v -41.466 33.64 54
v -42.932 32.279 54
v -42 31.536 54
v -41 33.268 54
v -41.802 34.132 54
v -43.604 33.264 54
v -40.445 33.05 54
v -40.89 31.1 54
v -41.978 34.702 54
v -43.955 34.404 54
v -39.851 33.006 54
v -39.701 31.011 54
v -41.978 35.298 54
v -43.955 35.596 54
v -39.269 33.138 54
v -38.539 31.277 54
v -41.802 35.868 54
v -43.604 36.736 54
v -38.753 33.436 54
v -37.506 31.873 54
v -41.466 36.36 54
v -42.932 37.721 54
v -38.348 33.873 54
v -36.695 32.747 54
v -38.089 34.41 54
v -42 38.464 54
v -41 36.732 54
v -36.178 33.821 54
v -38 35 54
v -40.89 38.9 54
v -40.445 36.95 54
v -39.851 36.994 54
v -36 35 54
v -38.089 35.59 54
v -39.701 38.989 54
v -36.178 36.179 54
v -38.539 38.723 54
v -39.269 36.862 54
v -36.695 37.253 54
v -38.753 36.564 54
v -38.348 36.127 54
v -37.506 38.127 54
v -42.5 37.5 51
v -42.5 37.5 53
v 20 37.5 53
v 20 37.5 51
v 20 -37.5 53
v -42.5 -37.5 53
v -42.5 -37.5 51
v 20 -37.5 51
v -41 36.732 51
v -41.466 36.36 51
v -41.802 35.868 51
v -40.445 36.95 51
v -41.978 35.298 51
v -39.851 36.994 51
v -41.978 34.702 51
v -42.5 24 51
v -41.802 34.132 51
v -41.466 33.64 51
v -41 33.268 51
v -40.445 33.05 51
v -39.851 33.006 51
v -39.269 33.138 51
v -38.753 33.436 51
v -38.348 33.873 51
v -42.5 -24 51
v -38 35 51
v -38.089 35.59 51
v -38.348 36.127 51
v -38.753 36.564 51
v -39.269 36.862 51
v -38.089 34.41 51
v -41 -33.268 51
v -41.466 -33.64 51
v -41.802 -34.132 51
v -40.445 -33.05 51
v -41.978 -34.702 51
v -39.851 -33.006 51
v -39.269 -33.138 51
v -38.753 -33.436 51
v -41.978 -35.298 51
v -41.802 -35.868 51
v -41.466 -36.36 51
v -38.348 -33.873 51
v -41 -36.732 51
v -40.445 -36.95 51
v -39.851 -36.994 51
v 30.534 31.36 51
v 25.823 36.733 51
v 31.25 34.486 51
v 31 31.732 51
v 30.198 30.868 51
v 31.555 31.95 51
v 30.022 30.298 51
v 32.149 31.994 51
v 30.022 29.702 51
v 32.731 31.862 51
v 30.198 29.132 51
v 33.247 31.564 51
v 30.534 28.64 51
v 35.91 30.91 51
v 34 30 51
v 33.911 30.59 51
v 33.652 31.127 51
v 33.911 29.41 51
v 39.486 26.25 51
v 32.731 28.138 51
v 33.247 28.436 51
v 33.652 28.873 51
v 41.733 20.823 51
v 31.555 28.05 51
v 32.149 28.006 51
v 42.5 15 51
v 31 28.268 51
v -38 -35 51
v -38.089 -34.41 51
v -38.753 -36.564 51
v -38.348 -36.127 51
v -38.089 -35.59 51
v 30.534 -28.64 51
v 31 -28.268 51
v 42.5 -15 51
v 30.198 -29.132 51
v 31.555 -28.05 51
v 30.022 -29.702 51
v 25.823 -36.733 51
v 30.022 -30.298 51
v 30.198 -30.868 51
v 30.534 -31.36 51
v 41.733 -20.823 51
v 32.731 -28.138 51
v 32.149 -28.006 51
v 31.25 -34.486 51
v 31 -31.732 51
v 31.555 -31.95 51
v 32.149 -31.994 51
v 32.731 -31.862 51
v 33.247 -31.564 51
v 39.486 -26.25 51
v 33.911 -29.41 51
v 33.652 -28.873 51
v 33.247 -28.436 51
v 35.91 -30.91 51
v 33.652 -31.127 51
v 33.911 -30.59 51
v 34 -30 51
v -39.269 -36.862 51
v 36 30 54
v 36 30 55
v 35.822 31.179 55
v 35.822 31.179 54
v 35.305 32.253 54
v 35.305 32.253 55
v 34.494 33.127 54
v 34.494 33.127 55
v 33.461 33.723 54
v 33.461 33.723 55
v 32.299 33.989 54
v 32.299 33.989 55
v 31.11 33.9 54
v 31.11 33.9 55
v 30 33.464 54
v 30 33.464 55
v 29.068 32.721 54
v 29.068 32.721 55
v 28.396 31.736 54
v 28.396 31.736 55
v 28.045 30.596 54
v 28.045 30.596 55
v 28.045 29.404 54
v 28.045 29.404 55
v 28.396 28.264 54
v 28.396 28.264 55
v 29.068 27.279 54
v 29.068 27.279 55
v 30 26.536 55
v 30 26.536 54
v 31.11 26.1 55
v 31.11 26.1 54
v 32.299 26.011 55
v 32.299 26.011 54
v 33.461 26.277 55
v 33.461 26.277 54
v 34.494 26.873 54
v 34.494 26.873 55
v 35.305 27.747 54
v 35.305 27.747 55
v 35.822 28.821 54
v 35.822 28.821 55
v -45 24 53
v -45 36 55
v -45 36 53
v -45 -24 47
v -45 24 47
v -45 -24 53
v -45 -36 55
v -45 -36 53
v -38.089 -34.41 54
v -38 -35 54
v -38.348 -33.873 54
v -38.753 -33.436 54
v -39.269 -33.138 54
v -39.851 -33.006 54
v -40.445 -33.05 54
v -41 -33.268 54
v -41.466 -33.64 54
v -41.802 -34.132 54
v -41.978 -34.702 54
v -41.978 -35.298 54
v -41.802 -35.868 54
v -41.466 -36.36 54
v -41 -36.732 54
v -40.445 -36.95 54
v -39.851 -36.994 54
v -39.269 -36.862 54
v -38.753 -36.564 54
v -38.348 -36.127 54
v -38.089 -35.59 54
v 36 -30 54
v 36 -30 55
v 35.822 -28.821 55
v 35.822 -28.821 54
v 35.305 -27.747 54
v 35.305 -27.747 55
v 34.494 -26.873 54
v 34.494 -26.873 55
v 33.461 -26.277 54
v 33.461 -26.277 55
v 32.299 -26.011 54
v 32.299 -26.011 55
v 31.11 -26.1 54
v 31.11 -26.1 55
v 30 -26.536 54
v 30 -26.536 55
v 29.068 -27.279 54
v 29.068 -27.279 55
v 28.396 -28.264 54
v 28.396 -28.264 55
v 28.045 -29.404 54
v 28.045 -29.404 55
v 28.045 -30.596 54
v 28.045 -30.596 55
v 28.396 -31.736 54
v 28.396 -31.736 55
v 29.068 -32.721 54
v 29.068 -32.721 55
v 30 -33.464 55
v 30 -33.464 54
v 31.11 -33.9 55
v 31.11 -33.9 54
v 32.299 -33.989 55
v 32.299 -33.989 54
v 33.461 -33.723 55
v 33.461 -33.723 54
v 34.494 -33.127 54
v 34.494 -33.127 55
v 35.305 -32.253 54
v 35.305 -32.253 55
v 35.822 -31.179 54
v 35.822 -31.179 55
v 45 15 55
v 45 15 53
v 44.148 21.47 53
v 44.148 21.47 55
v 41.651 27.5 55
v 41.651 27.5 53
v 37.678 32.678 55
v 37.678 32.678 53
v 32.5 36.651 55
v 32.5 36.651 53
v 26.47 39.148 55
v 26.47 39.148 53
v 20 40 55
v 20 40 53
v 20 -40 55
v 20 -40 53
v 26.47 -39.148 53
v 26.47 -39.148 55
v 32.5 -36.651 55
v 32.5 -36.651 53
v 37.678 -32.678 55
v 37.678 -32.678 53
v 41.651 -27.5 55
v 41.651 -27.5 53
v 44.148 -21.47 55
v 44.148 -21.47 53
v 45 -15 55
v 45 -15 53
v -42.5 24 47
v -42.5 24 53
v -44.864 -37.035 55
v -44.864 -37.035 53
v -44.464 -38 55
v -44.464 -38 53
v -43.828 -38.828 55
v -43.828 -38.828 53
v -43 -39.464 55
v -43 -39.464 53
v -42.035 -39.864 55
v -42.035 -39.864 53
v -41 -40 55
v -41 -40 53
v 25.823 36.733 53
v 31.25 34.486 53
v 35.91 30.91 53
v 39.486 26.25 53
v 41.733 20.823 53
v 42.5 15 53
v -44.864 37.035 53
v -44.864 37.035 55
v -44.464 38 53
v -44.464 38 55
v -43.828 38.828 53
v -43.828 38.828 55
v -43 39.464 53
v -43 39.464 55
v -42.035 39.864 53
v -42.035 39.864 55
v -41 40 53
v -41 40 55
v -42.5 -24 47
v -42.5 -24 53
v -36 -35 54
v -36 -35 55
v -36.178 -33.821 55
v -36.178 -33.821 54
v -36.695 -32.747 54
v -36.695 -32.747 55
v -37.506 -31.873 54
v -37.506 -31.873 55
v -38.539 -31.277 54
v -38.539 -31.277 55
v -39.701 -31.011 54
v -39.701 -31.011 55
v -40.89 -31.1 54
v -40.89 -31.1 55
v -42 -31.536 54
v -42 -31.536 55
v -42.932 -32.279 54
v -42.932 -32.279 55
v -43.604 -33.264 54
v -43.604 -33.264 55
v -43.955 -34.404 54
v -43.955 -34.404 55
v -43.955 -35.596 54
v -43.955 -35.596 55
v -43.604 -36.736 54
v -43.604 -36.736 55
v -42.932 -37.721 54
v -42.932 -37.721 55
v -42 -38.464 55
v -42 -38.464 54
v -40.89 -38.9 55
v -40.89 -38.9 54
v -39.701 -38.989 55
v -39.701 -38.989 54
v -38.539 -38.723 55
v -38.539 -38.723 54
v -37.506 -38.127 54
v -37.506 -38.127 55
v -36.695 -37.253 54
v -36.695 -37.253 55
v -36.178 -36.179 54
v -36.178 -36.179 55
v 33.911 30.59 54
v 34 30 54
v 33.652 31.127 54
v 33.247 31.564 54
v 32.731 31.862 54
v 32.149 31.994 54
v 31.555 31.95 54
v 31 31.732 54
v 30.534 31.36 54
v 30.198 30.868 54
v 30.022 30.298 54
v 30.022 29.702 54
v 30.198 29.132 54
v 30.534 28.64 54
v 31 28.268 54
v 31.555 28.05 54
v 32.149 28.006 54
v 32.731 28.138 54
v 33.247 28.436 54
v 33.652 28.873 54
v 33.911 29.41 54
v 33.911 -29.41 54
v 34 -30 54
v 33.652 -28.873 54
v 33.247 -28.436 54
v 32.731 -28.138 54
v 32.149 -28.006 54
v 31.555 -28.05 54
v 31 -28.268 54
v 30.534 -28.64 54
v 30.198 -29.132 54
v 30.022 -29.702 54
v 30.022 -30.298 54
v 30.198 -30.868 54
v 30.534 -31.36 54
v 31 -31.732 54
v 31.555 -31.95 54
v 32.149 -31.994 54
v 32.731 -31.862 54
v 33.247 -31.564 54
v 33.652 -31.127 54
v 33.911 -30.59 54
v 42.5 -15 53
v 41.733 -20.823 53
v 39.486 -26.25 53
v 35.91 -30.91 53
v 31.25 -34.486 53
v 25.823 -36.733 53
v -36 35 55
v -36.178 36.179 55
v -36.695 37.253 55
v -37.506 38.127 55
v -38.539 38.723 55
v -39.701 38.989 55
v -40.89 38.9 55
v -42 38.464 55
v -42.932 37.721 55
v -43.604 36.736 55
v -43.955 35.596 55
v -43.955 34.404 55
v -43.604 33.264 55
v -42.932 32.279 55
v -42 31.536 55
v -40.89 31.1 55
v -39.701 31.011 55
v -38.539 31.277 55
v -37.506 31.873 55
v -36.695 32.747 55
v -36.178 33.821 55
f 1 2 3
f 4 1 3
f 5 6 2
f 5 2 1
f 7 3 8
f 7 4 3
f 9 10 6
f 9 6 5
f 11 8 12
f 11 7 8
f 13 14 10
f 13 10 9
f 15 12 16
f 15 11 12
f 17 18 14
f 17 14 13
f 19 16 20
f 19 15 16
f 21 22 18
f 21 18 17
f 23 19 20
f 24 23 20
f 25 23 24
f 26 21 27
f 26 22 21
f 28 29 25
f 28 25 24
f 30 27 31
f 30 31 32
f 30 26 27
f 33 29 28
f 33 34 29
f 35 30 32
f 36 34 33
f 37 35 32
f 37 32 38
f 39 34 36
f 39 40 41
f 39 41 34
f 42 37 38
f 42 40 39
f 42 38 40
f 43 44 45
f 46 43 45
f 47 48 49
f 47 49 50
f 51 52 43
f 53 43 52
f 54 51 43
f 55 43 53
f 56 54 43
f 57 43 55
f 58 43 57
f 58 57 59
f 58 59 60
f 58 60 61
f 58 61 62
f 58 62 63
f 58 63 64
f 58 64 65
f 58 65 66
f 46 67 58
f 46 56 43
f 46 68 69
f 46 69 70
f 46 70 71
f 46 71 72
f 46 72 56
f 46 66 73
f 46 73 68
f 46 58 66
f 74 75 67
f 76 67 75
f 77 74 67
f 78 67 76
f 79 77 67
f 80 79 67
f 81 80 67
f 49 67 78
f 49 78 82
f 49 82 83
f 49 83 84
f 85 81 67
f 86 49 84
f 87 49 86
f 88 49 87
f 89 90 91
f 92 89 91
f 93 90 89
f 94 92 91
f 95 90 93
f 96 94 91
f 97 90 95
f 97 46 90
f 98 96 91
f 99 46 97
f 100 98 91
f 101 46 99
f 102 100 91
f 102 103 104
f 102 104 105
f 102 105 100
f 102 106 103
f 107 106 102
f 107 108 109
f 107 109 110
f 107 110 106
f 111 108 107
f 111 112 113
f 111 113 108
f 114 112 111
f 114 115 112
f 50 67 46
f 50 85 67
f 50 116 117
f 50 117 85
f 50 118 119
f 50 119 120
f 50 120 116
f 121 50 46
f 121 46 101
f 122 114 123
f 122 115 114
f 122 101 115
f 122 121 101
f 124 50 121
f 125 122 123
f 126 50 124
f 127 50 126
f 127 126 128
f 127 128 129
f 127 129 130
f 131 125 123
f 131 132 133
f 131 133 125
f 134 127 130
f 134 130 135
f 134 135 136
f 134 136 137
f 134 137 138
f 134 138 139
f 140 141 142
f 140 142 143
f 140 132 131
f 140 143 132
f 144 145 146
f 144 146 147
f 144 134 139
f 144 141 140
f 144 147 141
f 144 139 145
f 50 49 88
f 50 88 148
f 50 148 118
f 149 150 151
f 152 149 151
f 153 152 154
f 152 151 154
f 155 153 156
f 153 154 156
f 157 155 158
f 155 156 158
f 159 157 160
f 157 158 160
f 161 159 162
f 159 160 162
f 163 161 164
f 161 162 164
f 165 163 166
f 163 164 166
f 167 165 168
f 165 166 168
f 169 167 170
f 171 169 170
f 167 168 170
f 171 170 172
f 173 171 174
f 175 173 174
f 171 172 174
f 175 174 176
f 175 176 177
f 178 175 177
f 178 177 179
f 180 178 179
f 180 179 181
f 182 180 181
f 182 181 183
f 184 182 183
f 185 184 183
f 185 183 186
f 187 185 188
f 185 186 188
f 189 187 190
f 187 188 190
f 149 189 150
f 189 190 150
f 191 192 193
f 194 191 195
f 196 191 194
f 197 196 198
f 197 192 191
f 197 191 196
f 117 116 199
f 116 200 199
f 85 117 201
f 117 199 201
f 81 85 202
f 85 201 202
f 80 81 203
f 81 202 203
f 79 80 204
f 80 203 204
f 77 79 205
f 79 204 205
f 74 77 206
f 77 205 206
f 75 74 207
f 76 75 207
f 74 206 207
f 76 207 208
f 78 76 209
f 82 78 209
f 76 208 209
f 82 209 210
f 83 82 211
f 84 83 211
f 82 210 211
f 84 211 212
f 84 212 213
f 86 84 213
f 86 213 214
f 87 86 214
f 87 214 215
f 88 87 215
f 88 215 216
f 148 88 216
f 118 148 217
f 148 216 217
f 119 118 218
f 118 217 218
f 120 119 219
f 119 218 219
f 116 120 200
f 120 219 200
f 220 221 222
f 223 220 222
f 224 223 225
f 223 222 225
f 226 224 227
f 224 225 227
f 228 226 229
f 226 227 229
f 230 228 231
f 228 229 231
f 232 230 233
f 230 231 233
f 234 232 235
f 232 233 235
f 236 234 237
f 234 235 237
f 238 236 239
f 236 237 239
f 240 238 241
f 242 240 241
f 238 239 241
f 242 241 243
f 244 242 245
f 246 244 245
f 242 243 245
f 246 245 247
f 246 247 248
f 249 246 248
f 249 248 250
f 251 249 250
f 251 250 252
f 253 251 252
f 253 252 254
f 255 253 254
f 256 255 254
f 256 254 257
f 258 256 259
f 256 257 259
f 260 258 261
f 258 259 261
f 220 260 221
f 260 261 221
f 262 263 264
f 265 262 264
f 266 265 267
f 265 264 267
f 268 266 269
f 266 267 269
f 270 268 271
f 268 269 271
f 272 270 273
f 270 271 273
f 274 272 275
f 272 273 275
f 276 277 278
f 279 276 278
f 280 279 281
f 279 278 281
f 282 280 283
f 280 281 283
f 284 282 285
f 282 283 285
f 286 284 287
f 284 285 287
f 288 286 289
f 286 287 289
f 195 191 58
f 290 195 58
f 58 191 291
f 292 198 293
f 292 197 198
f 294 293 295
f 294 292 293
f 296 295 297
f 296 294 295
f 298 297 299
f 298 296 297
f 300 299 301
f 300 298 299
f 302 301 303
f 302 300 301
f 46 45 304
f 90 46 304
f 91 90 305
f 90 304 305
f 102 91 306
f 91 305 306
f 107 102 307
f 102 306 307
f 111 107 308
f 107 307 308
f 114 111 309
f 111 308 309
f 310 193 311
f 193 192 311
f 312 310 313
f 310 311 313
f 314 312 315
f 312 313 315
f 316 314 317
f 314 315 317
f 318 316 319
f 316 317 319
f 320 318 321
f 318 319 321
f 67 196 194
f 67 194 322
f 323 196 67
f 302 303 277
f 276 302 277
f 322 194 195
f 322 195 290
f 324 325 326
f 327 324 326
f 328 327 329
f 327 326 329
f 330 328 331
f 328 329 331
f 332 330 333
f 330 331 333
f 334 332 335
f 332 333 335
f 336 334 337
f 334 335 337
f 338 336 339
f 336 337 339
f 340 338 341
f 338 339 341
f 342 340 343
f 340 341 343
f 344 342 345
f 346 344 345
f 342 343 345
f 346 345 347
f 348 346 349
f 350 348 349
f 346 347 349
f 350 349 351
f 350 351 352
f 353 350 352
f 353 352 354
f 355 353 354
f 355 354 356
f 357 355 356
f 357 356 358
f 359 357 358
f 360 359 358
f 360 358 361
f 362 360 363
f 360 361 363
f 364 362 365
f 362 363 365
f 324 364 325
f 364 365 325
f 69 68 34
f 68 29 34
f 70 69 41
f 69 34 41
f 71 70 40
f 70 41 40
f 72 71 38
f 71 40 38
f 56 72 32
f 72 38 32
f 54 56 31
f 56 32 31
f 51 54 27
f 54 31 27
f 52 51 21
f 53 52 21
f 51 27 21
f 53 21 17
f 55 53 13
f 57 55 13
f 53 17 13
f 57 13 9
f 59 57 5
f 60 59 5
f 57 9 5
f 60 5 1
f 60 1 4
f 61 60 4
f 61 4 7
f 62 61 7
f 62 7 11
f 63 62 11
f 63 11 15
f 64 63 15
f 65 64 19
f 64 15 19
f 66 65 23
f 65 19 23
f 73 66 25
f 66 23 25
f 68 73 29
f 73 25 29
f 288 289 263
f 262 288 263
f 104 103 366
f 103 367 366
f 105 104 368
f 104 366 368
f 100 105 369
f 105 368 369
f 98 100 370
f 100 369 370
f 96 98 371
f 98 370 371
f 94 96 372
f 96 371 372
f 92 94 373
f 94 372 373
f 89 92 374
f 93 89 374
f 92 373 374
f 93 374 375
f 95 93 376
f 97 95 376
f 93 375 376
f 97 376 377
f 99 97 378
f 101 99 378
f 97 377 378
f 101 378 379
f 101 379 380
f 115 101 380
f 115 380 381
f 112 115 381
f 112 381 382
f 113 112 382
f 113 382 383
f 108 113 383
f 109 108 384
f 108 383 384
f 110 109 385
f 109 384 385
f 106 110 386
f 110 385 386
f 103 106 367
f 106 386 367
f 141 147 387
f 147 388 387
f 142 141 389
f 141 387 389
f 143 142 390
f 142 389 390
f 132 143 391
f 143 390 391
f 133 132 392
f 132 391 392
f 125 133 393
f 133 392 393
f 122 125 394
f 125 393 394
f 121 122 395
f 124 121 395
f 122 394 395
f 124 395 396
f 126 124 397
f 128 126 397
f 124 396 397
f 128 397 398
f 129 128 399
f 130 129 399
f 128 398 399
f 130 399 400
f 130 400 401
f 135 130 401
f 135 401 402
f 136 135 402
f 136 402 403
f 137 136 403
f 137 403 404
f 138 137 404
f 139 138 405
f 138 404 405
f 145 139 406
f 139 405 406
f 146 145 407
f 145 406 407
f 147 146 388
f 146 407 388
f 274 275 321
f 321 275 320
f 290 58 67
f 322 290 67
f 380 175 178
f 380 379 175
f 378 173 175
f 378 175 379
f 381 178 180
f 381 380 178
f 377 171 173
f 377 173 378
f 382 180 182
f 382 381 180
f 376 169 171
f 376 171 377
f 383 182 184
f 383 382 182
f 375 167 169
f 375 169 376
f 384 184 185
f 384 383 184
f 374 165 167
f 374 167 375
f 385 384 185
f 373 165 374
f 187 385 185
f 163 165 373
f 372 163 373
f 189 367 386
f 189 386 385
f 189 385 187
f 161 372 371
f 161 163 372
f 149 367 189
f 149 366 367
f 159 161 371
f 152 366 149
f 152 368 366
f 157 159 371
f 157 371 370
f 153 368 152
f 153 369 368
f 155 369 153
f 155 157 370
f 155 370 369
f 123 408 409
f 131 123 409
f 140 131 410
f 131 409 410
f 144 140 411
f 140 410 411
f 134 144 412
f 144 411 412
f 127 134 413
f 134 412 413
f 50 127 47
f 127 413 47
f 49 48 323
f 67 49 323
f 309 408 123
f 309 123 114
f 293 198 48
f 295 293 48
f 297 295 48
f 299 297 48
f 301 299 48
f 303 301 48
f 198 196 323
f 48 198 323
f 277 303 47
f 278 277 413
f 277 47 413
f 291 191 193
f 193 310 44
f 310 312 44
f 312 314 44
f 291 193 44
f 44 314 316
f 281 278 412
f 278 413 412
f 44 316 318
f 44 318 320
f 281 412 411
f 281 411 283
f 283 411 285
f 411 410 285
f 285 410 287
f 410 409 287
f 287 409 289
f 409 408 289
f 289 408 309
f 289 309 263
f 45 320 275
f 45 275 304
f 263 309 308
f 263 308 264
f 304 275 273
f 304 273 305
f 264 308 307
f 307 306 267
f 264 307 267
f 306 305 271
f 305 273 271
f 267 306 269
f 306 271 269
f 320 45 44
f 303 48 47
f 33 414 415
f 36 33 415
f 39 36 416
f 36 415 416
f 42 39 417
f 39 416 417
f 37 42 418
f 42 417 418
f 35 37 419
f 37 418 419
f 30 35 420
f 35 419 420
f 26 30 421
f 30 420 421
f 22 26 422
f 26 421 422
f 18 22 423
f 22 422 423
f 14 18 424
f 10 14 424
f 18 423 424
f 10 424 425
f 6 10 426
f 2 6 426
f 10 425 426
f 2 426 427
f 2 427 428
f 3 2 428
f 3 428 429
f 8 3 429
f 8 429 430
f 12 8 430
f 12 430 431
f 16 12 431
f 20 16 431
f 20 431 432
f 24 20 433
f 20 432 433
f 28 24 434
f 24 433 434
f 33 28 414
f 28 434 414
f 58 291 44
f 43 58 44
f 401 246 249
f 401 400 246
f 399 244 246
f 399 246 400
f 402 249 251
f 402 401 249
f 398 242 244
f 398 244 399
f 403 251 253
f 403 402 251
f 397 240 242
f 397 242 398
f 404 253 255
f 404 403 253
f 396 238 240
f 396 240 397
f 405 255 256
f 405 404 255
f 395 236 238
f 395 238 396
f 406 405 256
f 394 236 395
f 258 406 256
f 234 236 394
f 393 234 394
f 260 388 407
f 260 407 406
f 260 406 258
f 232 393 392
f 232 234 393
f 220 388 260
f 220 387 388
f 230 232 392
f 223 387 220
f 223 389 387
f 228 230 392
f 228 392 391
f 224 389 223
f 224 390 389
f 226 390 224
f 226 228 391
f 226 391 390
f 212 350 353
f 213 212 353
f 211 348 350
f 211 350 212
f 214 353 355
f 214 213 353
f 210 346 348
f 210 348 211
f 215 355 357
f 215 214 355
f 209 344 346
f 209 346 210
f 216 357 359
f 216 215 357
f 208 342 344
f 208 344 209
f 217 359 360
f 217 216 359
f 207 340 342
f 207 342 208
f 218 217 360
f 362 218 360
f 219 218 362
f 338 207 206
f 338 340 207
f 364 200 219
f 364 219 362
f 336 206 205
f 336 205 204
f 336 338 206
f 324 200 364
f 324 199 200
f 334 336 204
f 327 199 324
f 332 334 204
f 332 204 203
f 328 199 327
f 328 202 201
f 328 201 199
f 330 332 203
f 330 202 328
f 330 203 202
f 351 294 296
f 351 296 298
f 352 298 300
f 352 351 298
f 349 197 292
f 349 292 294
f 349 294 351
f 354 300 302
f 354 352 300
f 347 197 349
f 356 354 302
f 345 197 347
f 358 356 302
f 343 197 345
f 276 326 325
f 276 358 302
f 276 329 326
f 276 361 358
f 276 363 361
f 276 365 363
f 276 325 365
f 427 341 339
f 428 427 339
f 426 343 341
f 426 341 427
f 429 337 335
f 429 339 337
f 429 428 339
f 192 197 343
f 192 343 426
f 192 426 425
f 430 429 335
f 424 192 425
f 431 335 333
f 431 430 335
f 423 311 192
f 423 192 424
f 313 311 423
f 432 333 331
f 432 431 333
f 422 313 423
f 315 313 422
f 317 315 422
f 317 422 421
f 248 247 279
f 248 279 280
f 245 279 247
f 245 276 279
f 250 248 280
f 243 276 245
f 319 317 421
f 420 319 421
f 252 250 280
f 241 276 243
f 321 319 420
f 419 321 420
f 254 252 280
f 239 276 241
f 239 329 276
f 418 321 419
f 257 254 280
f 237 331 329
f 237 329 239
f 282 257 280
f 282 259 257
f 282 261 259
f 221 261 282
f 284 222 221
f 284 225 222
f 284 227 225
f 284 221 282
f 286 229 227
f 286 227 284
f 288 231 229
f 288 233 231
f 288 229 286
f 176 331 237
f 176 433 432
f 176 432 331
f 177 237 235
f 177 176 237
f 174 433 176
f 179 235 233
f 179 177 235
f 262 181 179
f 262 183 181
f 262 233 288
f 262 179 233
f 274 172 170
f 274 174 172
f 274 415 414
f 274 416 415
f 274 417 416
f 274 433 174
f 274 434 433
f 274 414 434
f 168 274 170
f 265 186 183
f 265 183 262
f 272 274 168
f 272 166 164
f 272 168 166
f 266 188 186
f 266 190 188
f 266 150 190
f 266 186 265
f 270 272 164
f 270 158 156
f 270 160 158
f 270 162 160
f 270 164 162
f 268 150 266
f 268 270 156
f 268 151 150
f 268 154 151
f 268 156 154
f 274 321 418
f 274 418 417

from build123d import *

# Parameters (mm, degrees)
SKETCH004_R     = 2
PAD003_DEPTH    = 2
PAD004_DEPTH    = 2
SKETCH006_W     = 2.5
SKETCH006_H     = 48
PAD005_DEPTH    = 6
SKETCH007_R     = 2
POCKET001_DEPTH = 8.001
SKETCH008_R     = 4
POCKET002_DEPTH = 1
FILLET001_R     = 4


with BuildPart() as part:
    # Sketch004 → Pad003 (new body)
    with BuildSketch(Plane.XY.offset(53)):
        with BuildLine():
            Line((20, 40), (-45, 40))
            Line((-45, 40), (-45, -40))
            Line((-45, -40), (20, -40))
            ThreePointArc((20, -40), (37.67767, -32.67767), (45, -15))
            Line((45, -15), (45, 15))
            ThreePointArc((45, 15), (37.67767, 32.67767), (20, 40))
        make_face()
        with Locations((-40, 35)):
            Circle(SKETCH004_R, mode=Mode.SUBTRACT)
        with Locations((32, 30)):
            Circle(SKETCH004_R, mode=Mode.SUBTRACT)
        with Locations((-40, -35)):
            Circle(SKETCH004_R, mode=Mode.SUBTRACT)
        with Locations((32, -30)):
            Circle(SKETCH004_R, mode=Mode.SUBTRACT)
    extrude(amount=PAD003_DEPTH)

    # Sketch005 (on Face7 of Pad003) → Pad004 (join)
    with BuildSketch(Plane(origin=(0, 0, 53), x_dir=(1, 0, 0), z_dir=(0, 0, -1))):
        with BuildLine():
            Line((-42.5, 37.5), (-42.5, -37.5))
            Line((-42.5, -37.5), (20, -37.5))
            ThreePointArc((20, -37.5), (35.909903, -30.909903), (42.5, -15))
            Line((42.5, 15), (42.5, -15))
            ThreePointArc((42.5, 15), (35.909903, 30.909903), (20, 37.5))
            Line((-42.5, 37.5), (20, 37.5))
        make_face()
    extrude(amount=PAD004_DEPTH)

    # Sketch006 (on Face4 of Pad004) → Pad005 (join)
    with BuildSketch(Plane(origin=(0, 0, 53), x_dir=(1, 0, 0), z_dir=(0, 0, -1))):
        with Locations((-43.75, 0)):
            Rectangle(SKETCH006_W, SKETCH006_H)
    extrude(amount=PAD005_DEPTH)

    # Sketch007 (on Face5 of Pad005) → Pocket001 (cut, through all)
    with BuildSketch(Plane.XY.offset(55)):
        with Locations((-40, 35)):
            Circle(SKETCH007_R)
        with Locations((-40, -35)):
            Circle(SKETCH007_R)
        with Locations((32, -30)):
            Circle(SKETCH007_R)
        with Locations((32, 30)):
            Circle(SKETCH007_R)
    extrude(amount=-POCKET001_DEPTH, mode=Mode.SUBTRACT)

    # Sketch008 (on Face5 of Pocket001) → Pocket002 (cut)
    with BuildSketch(Plane.XY.offset(55)):
        with Locations((32, 30)):
            Circle(SKETCH008_R)
        with Locations((-40, 35)):
            Circle(SKETCH008_R)
        with Locations((32, -30)):
            Circle(SKETCH008_R)
        with Locations((-40, -35)):
            Circle(SKETCH008_R)
    extrude(amount=-POCKET002_DEPTH, mode=Mode.SUBTRACT)

    # Fillet001
    fillet001_edges = [part.edges().sort_by_distance(p)[0] for p in [
        (-45, 40, 54),
        (-45, -40, 54),
    ]]
    fillet(fillet001_edges, radius=FILLET001_R)


solid = part.part
